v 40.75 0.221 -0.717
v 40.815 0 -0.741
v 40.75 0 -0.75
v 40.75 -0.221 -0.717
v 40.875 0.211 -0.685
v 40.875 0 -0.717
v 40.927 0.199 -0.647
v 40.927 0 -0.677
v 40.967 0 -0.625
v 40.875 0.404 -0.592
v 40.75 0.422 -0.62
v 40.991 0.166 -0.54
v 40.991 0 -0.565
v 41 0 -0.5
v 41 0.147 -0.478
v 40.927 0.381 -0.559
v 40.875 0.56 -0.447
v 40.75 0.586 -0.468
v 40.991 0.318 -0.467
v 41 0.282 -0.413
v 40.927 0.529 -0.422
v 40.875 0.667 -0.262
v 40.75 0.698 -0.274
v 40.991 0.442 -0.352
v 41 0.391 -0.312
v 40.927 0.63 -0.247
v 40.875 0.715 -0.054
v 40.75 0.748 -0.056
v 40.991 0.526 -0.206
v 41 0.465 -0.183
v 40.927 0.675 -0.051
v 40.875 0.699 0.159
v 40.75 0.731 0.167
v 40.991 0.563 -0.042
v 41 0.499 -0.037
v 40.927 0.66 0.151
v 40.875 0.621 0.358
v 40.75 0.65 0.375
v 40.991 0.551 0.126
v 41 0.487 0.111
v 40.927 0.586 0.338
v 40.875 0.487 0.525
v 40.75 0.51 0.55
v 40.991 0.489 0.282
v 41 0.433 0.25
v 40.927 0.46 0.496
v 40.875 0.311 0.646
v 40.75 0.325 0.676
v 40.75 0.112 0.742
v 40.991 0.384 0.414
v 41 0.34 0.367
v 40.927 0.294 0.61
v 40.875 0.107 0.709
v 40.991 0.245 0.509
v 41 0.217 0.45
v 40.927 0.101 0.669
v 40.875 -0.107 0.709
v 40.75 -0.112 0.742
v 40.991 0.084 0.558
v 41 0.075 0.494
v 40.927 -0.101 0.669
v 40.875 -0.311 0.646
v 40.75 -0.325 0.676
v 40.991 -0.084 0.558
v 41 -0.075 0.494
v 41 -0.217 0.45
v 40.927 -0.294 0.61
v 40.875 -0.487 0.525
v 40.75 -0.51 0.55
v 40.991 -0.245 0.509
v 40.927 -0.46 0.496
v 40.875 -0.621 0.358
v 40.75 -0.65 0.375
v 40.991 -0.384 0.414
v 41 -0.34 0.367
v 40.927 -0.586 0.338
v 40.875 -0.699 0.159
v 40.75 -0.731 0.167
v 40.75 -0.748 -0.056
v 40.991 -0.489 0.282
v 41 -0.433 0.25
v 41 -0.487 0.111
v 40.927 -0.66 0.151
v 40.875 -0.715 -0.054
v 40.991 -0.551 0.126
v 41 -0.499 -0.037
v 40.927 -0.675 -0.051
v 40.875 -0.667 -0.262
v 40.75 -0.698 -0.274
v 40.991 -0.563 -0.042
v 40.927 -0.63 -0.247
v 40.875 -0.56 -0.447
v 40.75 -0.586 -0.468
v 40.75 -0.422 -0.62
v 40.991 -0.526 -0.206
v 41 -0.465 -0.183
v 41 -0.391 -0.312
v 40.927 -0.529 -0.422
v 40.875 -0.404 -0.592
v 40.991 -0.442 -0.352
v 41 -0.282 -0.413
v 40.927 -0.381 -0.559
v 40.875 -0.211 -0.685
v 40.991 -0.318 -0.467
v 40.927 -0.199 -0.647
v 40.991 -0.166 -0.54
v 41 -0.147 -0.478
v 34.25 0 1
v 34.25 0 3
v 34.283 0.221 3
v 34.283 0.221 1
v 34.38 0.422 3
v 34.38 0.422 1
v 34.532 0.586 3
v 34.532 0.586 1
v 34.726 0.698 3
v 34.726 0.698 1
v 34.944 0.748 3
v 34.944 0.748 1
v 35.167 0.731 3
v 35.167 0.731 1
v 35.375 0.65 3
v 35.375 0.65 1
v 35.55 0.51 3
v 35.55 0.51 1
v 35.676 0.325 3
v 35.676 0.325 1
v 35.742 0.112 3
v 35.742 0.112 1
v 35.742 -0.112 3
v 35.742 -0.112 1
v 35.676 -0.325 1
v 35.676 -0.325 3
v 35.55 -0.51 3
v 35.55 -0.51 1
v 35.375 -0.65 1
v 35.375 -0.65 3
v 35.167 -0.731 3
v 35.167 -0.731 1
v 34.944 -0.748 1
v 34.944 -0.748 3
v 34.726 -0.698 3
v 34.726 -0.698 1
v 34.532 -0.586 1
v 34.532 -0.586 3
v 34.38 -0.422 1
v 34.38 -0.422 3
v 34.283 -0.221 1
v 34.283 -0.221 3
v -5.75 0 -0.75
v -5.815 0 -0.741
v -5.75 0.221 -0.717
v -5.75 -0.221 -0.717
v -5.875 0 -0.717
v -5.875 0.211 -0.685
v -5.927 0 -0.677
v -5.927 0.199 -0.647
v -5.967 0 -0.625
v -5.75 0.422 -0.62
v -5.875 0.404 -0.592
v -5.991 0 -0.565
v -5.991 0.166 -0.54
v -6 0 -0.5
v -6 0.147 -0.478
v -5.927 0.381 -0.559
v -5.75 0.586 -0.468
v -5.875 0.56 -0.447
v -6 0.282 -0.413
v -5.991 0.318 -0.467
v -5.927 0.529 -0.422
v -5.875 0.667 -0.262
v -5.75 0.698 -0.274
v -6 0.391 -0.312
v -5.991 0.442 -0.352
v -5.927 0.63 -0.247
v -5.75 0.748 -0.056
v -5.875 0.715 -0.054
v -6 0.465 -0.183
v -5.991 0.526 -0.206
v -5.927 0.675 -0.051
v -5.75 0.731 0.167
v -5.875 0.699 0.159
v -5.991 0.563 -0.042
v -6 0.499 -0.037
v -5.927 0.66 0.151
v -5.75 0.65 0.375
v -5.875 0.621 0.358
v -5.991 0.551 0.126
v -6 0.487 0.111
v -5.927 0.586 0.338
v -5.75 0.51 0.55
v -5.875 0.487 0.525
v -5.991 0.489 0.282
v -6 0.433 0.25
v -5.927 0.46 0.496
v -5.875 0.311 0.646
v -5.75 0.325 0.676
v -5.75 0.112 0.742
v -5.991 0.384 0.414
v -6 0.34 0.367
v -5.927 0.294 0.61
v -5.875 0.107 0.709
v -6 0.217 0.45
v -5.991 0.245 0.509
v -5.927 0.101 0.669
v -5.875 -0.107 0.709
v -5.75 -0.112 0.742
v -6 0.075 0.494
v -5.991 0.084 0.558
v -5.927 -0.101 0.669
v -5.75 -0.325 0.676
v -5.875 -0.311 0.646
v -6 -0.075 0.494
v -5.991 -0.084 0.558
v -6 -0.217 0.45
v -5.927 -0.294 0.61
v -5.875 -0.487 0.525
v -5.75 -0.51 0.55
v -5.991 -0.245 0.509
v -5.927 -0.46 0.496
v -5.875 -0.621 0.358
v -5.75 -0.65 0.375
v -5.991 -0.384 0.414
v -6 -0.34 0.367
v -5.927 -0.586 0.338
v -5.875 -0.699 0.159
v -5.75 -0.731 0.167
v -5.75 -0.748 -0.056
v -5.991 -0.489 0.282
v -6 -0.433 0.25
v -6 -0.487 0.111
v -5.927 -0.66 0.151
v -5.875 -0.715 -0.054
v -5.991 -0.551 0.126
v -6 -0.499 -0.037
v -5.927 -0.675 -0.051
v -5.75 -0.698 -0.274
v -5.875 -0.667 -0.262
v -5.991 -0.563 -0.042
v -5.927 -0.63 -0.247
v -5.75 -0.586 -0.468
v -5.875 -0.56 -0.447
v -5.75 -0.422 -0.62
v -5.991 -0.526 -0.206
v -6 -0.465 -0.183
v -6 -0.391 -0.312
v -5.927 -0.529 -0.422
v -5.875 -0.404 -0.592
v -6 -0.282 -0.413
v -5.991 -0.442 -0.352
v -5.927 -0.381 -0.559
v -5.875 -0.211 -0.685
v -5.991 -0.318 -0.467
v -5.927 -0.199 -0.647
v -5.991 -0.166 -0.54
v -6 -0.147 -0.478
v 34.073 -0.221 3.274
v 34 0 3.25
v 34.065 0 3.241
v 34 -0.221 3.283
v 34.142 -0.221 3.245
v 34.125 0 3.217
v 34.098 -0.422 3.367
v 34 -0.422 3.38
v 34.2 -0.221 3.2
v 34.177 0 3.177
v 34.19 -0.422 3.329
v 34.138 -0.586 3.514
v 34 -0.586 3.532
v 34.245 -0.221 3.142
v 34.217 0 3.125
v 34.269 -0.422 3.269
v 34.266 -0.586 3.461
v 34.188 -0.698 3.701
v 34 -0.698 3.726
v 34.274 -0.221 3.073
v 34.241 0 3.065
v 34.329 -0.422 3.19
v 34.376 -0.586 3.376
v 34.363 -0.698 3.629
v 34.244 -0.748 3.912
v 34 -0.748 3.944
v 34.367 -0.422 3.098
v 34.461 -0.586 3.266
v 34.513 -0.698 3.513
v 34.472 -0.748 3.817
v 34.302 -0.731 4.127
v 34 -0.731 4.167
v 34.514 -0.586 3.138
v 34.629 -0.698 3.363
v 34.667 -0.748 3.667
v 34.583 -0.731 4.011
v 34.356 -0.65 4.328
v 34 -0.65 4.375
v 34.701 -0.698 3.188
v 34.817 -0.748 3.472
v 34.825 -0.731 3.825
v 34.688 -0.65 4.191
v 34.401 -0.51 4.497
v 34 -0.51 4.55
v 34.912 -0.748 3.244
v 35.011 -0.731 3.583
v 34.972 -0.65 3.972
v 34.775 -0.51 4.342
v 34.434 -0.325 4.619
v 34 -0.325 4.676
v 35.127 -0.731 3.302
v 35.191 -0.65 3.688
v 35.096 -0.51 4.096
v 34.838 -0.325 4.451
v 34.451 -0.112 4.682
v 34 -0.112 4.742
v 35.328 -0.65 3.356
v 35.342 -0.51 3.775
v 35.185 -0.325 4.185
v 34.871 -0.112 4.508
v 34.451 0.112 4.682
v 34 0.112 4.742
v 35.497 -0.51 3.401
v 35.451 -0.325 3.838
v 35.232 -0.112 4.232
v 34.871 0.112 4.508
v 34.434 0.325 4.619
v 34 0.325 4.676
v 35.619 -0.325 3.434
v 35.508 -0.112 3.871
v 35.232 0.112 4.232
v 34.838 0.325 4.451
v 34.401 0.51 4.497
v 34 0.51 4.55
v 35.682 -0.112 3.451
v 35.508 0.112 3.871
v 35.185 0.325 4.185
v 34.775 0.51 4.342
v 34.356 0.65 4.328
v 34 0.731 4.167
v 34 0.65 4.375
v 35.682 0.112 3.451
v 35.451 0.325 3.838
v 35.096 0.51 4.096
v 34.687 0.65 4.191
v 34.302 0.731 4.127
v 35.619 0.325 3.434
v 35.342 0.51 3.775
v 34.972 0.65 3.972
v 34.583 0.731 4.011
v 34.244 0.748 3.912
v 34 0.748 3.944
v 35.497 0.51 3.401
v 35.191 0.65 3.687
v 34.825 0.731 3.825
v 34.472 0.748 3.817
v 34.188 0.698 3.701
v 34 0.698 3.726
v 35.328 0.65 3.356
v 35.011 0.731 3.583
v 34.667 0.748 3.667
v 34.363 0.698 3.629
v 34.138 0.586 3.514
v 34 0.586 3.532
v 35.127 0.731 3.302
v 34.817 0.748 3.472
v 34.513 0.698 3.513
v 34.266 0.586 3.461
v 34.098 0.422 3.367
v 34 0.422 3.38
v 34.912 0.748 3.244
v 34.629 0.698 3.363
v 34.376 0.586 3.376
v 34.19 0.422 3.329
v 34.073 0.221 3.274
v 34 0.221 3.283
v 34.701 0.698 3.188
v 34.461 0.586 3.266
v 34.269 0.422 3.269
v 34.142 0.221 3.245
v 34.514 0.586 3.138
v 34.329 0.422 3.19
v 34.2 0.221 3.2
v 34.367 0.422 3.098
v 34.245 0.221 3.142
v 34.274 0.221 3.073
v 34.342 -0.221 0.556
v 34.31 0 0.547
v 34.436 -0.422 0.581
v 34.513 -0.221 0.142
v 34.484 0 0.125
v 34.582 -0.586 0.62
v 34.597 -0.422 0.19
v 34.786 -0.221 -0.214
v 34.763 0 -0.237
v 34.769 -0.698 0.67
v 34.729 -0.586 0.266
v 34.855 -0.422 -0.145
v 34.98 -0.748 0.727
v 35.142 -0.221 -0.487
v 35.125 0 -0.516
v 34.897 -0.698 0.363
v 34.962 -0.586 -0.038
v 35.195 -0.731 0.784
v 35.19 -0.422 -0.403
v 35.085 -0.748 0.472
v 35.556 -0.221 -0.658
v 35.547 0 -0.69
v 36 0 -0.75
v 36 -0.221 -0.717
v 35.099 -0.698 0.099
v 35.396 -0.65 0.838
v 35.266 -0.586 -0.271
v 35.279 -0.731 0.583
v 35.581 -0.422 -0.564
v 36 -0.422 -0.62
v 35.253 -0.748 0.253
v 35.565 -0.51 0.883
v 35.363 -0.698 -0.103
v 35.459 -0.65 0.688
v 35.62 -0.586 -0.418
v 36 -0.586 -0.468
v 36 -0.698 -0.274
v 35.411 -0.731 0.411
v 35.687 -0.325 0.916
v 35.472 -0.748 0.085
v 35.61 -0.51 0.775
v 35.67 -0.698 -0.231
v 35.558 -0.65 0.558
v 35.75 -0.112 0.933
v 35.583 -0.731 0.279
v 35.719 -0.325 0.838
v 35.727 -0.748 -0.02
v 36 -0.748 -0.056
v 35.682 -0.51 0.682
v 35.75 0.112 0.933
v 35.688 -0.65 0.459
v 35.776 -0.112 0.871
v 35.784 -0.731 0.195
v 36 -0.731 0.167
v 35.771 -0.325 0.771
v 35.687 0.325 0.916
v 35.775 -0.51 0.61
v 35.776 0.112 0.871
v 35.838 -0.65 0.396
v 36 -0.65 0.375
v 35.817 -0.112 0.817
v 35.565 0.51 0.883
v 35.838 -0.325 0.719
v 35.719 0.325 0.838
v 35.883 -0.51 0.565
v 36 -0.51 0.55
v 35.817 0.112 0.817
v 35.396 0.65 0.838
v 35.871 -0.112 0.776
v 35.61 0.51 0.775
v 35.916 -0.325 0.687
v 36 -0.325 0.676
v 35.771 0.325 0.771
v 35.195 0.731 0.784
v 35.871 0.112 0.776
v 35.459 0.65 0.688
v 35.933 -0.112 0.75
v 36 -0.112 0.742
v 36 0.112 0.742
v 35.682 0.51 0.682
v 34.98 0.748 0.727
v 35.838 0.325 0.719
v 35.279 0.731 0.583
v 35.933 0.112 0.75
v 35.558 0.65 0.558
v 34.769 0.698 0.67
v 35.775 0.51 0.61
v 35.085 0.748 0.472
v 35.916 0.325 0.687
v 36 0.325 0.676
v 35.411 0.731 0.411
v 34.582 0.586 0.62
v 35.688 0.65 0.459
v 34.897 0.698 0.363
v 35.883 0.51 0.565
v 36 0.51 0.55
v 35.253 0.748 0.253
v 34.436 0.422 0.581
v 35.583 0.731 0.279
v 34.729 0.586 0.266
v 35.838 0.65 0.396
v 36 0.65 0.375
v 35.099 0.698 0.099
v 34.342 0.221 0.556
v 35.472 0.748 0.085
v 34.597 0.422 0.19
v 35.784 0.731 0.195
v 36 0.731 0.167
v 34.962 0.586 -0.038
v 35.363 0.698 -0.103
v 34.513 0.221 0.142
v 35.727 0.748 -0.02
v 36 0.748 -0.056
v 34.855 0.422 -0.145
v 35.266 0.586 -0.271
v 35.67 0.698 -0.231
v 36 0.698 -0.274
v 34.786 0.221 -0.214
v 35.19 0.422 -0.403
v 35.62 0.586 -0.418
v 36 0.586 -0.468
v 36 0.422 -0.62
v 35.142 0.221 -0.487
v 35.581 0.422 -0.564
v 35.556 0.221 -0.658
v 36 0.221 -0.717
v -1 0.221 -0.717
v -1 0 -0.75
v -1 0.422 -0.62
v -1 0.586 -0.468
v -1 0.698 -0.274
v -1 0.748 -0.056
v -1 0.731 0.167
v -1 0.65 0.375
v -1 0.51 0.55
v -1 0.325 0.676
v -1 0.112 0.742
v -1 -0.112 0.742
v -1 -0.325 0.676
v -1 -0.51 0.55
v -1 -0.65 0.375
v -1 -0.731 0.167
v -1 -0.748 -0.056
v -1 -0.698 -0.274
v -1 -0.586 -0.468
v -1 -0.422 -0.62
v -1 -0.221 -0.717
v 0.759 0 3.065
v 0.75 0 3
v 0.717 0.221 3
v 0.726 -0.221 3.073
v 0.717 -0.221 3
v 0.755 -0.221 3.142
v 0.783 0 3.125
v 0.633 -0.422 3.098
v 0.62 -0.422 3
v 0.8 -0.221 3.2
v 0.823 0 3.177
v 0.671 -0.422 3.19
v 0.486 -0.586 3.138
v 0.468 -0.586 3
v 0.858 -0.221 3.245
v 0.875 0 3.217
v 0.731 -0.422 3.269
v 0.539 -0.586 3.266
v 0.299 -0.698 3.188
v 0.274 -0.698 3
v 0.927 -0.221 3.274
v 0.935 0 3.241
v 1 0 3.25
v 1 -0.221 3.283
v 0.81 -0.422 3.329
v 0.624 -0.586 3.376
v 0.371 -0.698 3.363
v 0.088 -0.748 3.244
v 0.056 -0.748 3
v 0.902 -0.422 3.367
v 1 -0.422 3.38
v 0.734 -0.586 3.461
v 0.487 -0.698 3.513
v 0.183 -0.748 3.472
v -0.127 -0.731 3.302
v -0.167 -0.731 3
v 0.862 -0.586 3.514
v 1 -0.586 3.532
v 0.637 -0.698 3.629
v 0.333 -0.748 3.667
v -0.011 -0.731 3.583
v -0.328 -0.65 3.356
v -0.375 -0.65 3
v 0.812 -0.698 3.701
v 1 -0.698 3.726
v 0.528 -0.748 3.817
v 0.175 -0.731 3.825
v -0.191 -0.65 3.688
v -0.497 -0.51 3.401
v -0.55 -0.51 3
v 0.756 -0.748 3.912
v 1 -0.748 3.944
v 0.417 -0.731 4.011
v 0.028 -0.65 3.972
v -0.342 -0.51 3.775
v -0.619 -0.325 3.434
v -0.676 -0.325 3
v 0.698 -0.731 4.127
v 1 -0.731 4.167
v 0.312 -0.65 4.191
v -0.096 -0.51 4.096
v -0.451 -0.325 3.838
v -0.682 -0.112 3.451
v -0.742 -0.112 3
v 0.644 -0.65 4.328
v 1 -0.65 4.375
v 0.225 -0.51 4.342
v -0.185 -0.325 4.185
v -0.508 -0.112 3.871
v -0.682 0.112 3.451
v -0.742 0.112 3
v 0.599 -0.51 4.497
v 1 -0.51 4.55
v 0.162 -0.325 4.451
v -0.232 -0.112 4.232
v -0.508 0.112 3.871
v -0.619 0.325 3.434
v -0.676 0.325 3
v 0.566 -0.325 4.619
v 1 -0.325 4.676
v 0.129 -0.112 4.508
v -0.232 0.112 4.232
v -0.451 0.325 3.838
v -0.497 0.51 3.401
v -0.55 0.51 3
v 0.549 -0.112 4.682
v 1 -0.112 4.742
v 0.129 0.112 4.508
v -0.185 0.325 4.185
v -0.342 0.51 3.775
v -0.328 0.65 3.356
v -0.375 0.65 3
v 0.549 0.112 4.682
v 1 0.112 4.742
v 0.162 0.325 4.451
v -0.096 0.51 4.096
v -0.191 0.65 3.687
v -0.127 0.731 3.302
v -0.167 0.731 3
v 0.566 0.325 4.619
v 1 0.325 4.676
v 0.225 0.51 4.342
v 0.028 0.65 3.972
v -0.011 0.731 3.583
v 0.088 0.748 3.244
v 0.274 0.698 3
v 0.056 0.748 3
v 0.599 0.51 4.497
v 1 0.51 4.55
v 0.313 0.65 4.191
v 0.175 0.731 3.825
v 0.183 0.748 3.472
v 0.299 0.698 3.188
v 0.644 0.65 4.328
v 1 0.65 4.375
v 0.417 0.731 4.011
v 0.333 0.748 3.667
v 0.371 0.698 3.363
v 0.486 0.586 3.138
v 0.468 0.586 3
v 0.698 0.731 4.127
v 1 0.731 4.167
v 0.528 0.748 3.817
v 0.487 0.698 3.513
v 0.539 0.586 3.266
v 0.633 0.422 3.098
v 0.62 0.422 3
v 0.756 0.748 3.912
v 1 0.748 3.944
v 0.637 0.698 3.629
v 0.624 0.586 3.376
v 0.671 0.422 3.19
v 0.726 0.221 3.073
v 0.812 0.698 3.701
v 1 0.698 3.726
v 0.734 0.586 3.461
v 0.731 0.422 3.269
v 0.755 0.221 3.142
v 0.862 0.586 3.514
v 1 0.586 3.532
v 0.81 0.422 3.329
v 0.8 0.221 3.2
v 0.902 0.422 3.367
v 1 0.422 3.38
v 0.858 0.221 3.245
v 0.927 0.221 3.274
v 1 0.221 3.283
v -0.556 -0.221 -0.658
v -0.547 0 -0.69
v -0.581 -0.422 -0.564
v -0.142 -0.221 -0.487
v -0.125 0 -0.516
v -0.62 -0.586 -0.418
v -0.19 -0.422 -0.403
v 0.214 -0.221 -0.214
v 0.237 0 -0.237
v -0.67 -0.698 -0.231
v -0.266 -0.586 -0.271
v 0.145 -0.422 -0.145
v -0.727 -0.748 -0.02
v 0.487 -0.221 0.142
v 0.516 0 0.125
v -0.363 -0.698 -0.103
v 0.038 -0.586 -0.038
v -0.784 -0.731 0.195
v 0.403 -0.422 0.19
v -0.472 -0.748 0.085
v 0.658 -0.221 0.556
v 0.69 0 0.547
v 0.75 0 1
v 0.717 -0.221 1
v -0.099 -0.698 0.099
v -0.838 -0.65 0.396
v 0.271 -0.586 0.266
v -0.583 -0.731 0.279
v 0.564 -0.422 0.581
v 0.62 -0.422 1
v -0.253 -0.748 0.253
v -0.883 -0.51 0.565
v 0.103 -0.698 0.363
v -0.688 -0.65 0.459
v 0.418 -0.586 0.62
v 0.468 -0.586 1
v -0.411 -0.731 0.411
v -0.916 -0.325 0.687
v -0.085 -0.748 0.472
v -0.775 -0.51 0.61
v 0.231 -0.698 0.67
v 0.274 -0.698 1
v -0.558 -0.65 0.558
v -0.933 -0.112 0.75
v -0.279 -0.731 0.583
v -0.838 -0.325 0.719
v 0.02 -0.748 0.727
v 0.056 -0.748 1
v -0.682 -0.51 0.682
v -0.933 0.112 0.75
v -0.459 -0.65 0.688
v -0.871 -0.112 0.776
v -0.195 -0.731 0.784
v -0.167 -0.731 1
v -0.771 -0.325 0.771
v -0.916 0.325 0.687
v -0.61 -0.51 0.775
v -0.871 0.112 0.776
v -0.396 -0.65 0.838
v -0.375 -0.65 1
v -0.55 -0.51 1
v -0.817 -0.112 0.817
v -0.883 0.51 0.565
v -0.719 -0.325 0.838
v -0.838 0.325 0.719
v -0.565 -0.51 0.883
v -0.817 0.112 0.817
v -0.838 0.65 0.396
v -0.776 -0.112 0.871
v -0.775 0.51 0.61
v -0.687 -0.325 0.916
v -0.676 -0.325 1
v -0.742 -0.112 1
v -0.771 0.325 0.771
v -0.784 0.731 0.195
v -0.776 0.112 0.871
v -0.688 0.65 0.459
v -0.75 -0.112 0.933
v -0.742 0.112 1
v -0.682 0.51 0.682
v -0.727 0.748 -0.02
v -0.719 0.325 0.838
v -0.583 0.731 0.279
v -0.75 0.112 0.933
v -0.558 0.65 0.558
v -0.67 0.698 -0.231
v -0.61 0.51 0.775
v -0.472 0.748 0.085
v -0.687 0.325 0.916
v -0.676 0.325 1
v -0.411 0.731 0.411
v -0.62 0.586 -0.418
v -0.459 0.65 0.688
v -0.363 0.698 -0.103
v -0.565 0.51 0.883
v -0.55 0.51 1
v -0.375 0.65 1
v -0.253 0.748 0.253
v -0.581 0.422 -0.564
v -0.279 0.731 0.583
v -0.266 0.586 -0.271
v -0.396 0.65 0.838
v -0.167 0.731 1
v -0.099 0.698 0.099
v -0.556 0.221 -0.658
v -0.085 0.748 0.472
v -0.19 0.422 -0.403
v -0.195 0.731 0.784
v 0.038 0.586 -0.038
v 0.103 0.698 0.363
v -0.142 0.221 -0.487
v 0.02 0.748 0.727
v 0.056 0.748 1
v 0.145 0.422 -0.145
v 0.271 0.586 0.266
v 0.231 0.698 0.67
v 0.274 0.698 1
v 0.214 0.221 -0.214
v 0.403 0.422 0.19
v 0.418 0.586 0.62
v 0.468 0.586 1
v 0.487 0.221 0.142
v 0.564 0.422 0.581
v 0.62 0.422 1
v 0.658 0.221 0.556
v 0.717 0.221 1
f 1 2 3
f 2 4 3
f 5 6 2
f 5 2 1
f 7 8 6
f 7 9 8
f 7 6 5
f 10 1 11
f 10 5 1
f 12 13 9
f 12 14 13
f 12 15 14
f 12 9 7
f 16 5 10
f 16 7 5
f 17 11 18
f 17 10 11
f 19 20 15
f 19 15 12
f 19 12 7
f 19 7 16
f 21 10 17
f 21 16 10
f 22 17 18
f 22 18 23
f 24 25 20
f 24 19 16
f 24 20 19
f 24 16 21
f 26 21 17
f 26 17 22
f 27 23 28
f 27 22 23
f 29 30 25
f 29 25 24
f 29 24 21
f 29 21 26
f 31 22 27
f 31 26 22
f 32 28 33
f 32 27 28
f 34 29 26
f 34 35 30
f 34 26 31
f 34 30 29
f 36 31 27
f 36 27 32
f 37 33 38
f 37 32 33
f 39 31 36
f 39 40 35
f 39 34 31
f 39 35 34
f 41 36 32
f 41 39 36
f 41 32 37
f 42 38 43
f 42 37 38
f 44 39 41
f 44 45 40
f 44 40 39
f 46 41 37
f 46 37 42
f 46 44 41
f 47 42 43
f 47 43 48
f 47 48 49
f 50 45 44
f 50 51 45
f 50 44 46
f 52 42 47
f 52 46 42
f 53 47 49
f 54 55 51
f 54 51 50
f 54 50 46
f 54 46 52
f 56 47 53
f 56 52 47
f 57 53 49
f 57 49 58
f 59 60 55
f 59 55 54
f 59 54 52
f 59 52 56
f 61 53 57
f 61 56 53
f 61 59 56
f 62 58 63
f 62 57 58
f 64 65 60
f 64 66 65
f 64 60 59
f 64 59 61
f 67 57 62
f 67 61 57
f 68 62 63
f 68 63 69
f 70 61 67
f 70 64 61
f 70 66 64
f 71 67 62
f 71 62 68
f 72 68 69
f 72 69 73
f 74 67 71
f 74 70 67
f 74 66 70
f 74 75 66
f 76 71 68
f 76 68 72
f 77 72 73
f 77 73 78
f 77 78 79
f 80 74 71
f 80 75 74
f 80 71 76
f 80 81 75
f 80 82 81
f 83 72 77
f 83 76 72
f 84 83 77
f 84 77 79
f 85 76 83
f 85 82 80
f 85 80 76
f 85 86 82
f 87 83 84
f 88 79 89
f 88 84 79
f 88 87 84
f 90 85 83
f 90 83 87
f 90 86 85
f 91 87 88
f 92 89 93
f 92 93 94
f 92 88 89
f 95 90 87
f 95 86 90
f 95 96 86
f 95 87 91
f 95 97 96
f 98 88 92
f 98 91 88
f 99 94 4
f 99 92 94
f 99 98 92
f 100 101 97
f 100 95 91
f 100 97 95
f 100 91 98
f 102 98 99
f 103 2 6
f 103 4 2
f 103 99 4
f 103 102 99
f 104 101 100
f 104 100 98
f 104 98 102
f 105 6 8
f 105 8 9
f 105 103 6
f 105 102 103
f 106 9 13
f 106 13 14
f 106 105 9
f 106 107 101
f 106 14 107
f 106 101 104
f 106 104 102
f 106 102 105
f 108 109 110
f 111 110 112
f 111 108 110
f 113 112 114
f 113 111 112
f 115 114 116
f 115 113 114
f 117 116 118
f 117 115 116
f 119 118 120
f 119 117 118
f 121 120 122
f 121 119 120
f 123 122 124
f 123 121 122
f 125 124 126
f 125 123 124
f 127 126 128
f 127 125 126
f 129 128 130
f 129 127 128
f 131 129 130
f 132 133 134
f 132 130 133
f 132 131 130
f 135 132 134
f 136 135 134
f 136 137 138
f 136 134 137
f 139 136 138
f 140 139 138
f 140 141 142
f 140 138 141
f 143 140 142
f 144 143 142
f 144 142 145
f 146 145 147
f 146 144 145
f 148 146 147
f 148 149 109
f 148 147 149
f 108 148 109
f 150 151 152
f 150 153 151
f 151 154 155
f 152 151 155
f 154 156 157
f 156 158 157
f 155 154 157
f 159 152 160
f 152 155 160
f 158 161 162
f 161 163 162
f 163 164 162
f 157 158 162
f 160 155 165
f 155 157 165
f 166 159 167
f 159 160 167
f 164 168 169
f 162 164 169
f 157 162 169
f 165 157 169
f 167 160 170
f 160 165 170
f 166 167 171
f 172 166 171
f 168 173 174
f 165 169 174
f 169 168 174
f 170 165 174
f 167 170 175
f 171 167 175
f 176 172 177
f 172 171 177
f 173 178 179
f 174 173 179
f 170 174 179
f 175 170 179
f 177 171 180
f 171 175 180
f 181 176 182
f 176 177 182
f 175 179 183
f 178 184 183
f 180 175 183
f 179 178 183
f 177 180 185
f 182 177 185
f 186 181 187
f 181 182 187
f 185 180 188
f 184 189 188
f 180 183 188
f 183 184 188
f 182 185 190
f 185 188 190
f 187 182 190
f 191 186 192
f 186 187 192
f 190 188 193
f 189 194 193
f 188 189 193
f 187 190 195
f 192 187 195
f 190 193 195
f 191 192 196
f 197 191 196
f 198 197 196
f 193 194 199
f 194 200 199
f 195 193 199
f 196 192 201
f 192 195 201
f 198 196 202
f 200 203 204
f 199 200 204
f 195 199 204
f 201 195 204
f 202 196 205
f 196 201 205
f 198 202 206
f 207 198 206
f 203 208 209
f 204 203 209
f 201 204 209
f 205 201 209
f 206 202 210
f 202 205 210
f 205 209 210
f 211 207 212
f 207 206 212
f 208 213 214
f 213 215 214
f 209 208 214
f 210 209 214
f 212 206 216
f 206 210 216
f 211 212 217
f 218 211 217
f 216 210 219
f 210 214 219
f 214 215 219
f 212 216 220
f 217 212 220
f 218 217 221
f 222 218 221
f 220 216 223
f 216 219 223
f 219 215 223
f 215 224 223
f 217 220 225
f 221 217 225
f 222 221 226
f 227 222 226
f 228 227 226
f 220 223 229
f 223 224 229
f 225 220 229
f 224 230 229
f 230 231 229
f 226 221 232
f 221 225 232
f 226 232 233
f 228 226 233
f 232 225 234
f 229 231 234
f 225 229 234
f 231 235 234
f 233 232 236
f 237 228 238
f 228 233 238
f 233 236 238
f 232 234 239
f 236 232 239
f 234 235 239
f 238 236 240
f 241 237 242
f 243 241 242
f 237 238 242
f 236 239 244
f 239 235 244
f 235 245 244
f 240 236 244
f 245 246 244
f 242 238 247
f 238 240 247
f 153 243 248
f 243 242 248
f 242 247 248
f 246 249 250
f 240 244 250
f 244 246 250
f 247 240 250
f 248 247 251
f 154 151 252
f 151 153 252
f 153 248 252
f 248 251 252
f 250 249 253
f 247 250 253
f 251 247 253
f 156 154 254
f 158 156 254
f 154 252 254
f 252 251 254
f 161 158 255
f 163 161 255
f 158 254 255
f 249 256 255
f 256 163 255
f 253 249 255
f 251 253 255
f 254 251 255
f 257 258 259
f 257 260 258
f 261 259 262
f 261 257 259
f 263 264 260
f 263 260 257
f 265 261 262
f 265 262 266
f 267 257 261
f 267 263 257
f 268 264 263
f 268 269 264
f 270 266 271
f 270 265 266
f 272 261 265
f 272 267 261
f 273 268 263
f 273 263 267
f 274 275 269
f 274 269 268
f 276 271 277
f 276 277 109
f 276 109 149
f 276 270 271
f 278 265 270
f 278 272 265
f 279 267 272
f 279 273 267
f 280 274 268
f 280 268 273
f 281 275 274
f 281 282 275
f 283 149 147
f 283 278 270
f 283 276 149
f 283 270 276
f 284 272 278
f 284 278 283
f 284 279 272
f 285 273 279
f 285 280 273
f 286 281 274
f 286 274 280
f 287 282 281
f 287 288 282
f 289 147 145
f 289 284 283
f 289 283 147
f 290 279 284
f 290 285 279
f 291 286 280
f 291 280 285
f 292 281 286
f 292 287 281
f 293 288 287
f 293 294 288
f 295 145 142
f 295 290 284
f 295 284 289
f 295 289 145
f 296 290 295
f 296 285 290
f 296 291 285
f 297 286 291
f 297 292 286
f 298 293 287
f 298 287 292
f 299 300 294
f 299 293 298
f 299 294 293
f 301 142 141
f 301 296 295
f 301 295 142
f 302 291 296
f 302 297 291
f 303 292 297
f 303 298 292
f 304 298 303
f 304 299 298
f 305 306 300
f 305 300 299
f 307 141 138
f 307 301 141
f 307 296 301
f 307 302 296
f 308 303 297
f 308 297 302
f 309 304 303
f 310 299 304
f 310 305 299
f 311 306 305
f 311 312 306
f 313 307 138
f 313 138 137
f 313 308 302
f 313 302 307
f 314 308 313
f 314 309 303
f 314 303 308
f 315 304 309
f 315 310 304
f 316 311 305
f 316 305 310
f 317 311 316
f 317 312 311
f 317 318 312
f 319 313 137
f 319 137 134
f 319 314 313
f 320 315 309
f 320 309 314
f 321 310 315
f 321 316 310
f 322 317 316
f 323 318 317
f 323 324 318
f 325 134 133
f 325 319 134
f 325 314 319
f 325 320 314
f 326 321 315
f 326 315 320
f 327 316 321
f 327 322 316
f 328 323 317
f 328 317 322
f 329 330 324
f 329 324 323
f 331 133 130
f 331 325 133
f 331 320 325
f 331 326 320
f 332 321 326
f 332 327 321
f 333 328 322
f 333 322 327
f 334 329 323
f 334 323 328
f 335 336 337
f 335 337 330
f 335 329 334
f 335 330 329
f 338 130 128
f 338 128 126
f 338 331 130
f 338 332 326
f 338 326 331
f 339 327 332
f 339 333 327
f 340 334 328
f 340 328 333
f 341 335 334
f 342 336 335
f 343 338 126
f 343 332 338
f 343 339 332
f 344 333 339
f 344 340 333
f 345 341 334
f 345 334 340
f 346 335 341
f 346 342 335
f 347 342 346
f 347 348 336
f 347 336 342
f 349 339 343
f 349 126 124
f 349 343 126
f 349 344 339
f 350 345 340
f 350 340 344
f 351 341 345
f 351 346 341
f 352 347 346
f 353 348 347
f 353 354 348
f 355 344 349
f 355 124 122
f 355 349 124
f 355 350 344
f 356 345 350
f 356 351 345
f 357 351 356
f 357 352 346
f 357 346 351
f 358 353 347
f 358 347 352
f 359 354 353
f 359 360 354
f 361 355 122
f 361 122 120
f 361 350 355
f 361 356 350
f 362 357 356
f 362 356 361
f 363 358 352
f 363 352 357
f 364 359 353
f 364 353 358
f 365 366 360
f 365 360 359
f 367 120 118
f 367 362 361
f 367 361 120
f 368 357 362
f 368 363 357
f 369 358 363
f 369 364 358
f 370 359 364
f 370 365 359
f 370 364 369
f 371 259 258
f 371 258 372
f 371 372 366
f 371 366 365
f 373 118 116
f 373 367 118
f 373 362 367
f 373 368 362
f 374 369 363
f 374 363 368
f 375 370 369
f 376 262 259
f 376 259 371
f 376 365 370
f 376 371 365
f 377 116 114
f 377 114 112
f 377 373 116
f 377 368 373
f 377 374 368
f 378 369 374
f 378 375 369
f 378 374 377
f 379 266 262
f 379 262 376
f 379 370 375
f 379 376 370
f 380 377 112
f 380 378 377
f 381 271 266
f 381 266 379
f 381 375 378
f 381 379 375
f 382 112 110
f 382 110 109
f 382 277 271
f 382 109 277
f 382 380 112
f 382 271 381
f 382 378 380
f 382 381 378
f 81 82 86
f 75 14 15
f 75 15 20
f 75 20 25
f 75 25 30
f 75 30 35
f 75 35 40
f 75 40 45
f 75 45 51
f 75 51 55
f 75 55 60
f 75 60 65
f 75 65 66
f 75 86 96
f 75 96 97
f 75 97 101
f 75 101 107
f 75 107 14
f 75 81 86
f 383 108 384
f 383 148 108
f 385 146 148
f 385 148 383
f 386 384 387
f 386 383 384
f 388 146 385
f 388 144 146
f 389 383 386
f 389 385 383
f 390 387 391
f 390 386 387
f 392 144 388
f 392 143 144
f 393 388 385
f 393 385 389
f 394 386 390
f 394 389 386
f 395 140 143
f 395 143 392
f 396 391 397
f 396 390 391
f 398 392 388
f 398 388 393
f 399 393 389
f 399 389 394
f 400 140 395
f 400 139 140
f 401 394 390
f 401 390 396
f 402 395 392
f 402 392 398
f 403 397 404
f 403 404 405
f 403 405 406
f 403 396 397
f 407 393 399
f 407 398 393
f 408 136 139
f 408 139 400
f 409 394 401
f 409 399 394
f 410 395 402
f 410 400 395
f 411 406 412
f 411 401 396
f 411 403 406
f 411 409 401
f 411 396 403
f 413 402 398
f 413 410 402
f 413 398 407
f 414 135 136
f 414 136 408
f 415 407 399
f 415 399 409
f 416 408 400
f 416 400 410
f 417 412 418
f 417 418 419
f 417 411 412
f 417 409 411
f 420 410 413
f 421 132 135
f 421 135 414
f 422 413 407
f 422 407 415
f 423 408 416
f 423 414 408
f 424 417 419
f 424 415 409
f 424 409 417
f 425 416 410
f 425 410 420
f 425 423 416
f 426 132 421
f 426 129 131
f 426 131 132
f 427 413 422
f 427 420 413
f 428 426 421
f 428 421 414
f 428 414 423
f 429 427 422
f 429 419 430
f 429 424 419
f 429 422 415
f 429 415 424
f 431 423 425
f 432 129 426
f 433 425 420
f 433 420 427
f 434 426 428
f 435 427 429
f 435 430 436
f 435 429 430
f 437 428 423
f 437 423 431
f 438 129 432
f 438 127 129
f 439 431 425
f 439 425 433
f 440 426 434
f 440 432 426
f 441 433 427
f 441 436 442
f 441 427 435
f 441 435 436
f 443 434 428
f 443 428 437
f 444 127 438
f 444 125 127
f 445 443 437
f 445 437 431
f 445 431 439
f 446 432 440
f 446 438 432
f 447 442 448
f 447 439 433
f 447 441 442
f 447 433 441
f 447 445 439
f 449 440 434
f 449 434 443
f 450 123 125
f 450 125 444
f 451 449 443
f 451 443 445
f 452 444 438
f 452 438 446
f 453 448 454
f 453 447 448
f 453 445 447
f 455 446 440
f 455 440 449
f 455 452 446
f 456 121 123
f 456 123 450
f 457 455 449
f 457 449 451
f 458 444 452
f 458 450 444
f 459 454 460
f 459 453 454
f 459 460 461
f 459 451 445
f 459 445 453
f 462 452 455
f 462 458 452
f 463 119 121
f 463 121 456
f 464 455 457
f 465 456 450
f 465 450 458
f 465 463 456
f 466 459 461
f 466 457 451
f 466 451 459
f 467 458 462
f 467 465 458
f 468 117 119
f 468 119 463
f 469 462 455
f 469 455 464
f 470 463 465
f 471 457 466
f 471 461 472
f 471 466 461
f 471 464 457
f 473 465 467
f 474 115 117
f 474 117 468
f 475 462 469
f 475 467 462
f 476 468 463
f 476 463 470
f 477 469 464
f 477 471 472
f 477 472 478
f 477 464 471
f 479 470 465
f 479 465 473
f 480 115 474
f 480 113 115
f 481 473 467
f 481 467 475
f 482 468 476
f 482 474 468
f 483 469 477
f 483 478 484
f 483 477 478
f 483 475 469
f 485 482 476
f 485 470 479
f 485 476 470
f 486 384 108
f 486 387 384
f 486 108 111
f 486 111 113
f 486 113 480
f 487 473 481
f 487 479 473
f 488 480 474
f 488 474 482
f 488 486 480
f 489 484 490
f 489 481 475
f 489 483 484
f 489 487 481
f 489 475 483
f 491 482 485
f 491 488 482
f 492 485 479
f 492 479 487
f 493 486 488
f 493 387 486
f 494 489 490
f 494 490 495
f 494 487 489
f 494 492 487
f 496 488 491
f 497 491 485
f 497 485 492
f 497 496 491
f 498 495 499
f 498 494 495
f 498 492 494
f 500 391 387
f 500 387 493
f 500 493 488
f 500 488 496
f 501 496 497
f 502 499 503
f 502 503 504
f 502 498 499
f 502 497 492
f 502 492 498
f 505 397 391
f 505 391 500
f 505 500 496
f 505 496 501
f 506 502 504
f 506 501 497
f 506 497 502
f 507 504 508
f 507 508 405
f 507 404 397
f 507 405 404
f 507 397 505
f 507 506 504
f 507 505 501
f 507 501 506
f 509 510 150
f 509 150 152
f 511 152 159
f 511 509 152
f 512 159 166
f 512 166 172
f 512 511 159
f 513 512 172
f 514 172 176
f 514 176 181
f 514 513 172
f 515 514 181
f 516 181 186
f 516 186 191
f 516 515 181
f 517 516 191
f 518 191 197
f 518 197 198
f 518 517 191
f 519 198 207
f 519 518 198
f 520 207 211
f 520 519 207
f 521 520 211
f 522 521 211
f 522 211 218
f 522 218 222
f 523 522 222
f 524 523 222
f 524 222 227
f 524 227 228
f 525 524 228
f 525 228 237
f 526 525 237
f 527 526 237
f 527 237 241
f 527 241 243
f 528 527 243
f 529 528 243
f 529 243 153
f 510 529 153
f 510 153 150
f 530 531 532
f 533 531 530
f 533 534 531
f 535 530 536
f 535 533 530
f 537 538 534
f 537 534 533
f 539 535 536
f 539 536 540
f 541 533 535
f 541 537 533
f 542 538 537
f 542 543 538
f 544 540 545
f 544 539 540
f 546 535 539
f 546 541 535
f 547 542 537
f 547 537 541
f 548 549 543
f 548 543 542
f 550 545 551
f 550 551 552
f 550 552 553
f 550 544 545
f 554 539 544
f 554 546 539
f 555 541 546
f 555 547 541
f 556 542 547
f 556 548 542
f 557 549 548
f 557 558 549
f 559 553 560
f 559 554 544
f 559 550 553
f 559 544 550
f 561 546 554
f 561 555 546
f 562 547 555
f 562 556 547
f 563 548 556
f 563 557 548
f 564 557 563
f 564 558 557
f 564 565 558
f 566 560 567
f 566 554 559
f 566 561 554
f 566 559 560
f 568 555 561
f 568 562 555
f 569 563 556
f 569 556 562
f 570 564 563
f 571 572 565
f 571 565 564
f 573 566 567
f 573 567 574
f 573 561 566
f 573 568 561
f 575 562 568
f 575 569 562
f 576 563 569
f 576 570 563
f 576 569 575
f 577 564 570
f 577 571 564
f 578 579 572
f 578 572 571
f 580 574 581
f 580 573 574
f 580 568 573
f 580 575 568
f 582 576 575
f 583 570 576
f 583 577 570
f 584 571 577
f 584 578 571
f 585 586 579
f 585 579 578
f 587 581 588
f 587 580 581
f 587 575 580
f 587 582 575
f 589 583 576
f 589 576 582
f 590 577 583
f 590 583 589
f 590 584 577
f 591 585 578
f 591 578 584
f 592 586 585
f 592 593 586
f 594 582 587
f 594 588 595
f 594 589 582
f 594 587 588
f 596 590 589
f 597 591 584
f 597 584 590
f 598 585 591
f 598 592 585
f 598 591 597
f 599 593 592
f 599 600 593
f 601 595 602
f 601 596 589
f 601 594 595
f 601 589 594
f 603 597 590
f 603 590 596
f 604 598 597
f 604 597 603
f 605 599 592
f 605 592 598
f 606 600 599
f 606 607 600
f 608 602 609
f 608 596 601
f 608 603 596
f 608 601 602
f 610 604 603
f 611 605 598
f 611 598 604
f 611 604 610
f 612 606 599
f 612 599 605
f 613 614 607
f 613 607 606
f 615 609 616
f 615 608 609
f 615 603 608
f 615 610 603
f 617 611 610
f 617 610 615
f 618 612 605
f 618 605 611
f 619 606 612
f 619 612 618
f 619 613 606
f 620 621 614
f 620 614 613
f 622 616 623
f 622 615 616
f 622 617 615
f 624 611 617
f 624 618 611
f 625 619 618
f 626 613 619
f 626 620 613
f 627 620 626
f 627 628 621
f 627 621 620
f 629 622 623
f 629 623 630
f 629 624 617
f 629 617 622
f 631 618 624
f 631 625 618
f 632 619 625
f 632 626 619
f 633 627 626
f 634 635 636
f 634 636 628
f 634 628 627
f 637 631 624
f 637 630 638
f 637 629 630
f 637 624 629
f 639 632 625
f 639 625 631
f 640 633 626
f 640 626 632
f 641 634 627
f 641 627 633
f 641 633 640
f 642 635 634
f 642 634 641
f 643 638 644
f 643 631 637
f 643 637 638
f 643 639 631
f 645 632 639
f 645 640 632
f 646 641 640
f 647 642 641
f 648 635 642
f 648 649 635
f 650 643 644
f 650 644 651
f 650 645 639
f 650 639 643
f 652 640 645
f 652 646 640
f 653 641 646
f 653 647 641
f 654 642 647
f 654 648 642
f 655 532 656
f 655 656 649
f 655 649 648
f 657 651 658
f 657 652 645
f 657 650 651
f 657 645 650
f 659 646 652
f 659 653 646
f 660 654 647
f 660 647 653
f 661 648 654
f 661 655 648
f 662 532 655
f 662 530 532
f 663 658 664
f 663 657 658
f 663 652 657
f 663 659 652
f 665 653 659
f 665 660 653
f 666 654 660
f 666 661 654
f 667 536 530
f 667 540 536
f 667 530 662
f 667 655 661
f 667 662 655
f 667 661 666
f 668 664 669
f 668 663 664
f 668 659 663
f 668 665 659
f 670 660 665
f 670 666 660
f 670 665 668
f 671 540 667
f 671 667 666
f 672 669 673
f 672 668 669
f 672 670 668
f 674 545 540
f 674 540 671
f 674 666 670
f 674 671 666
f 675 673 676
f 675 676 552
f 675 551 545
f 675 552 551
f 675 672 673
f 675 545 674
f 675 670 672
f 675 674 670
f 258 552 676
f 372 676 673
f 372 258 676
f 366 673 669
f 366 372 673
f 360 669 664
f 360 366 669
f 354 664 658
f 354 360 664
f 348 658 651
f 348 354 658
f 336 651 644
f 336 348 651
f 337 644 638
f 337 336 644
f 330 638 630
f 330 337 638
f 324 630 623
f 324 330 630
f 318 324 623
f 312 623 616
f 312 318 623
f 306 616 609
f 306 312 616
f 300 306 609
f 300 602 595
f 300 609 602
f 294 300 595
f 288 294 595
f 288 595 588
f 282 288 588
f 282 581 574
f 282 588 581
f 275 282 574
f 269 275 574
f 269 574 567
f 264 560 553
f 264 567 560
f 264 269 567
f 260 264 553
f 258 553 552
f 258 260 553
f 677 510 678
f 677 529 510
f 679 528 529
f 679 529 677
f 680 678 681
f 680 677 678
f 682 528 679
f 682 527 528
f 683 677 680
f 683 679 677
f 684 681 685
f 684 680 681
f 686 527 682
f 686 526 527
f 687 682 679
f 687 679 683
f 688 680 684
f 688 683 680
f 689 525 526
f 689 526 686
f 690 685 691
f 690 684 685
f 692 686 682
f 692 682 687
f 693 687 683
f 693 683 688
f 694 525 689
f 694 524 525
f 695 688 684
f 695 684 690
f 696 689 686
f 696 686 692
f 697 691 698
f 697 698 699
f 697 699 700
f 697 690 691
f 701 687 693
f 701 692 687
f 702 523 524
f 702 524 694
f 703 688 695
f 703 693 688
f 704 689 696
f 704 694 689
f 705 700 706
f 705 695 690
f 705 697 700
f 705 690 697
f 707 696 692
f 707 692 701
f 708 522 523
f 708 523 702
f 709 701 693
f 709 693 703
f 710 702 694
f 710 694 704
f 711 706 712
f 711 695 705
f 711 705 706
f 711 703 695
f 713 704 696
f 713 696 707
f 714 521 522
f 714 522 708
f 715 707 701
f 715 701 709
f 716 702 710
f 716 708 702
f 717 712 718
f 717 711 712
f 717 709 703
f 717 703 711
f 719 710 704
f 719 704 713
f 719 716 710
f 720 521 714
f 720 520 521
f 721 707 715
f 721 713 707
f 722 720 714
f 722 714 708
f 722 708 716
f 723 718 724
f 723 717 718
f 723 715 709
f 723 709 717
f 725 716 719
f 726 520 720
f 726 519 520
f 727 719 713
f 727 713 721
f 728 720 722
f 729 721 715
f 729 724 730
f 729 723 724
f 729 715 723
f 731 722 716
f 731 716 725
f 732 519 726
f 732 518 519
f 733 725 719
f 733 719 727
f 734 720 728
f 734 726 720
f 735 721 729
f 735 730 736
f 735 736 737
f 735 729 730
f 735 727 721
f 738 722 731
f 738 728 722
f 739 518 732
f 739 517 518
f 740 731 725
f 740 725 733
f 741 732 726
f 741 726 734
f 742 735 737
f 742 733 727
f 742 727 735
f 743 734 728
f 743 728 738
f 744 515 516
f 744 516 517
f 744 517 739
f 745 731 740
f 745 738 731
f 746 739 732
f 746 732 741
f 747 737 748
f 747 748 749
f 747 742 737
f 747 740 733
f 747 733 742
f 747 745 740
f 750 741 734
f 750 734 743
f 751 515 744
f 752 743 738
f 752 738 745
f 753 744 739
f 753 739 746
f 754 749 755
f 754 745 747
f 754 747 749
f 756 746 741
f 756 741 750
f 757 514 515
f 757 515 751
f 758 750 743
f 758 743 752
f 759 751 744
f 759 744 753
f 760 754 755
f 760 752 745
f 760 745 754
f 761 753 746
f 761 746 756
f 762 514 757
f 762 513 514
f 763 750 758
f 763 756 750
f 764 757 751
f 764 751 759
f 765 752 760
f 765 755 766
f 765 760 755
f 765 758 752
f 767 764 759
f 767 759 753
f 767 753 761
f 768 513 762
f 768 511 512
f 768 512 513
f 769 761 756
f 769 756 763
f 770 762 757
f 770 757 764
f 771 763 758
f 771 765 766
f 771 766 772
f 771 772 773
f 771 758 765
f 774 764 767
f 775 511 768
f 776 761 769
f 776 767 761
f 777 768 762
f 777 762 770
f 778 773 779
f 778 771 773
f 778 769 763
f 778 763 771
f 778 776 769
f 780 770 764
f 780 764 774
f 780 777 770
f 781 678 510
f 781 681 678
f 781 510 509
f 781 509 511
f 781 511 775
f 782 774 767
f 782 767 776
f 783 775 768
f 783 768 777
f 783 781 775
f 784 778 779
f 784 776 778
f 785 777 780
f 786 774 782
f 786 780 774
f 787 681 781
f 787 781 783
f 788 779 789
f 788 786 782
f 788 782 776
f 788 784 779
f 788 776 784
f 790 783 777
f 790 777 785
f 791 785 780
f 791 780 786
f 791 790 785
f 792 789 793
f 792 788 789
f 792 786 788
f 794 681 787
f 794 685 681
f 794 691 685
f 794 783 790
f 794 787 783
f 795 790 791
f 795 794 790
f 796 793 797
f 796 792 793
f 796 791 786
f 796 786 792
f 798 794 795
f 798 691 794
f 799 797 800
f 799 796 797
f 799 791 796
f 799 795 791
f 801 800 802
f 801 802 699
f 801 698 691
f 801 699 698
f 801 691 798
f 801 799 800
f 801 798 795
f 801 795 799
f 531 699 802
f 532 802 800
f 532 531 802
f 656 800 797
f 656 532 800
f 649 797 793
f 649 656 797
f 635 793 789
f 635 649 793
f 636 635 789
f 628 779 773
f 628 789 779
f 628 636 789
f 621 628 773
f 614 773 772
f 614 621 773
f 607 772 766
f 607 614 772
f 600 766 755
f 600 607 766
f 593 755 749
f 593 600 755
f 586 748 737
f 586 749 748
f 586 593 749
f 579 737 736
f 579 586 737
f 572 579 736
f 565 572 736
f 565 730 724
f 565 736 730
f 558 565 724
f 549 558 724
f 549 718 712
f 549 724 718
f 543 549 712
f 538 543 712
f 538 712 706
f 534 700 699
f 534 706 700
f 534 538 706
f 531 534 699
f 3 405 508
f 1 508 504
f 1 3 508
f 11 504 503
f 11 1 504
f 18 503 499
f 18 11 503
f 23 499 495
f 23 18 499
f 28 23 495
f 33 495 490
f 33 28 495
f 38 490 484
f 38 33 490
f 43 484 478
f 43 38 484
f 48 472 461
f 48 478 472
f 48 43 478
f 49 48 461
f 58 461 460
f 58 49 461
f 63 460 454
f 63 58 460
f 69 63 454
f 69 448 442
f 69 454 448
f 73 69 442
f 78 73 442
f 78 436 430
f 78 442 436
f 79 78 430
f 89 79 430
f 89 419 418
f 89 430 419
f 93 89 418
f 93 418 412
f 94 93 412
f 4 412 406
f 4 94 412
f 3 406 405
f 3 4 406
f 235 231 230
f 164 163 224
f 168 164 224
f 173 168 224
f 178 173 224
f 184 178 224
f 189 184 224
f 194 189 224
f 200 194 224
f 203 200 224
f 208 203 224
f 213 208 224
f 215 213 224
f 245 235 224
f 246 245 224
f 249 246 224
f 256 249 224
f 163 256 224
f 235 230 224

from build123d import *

# Parameters (mm, degrees)
SKETCH3_R = 0.75
FILLET1_R = 0.25


with BuildPart() as part:
    # Sweep1: sweep along a path in Sketch1
    with BuildLine(Plane(origin=(0, 0, 0), x_dir=(1, 0, 0), z_dir=(0, 1, 0))) as sweep1_path:
        Line((-6, 0), (-1, 0))
        ThreePointArc((-1, 0), (-0.292893219, -0.292893219), (0, -1))
        Line((0, -1), (0, -3))
        ThreePointArc((0, -3), (0.292893219, -3.707106781), (1, -4))
        Line((1, -4), (34, -4))
        ThreePointArc((34, -4), (34.707106781, -3.707106781), (35, -3))
        Line((35, -3), (35, -1))
        ThreePointArc((35, -1), (35.292893219, -0.292893219), (36, 0))
        Line((36, 0), (41, 0))
    # Sketch3 → Sweep1 (sweep)
    with BuildSketch(Plane(origin=(-6, 0, 0), x_dir=(0, 0, -1), z_dir=(1, 0, 0))):
        Circle(SKETCH3_R)
    sweep(path=sweep1_path.line)

    # Fillet1
    fillet1_edges = [part.edges().sort_by_distance(p)[0] for p in [
        (41, 0, 0.75),
        (-6, 0, 0.75),
    ]]
    fillet(fillet1_edges, radius=FILLET1_R)


solid = part.part
